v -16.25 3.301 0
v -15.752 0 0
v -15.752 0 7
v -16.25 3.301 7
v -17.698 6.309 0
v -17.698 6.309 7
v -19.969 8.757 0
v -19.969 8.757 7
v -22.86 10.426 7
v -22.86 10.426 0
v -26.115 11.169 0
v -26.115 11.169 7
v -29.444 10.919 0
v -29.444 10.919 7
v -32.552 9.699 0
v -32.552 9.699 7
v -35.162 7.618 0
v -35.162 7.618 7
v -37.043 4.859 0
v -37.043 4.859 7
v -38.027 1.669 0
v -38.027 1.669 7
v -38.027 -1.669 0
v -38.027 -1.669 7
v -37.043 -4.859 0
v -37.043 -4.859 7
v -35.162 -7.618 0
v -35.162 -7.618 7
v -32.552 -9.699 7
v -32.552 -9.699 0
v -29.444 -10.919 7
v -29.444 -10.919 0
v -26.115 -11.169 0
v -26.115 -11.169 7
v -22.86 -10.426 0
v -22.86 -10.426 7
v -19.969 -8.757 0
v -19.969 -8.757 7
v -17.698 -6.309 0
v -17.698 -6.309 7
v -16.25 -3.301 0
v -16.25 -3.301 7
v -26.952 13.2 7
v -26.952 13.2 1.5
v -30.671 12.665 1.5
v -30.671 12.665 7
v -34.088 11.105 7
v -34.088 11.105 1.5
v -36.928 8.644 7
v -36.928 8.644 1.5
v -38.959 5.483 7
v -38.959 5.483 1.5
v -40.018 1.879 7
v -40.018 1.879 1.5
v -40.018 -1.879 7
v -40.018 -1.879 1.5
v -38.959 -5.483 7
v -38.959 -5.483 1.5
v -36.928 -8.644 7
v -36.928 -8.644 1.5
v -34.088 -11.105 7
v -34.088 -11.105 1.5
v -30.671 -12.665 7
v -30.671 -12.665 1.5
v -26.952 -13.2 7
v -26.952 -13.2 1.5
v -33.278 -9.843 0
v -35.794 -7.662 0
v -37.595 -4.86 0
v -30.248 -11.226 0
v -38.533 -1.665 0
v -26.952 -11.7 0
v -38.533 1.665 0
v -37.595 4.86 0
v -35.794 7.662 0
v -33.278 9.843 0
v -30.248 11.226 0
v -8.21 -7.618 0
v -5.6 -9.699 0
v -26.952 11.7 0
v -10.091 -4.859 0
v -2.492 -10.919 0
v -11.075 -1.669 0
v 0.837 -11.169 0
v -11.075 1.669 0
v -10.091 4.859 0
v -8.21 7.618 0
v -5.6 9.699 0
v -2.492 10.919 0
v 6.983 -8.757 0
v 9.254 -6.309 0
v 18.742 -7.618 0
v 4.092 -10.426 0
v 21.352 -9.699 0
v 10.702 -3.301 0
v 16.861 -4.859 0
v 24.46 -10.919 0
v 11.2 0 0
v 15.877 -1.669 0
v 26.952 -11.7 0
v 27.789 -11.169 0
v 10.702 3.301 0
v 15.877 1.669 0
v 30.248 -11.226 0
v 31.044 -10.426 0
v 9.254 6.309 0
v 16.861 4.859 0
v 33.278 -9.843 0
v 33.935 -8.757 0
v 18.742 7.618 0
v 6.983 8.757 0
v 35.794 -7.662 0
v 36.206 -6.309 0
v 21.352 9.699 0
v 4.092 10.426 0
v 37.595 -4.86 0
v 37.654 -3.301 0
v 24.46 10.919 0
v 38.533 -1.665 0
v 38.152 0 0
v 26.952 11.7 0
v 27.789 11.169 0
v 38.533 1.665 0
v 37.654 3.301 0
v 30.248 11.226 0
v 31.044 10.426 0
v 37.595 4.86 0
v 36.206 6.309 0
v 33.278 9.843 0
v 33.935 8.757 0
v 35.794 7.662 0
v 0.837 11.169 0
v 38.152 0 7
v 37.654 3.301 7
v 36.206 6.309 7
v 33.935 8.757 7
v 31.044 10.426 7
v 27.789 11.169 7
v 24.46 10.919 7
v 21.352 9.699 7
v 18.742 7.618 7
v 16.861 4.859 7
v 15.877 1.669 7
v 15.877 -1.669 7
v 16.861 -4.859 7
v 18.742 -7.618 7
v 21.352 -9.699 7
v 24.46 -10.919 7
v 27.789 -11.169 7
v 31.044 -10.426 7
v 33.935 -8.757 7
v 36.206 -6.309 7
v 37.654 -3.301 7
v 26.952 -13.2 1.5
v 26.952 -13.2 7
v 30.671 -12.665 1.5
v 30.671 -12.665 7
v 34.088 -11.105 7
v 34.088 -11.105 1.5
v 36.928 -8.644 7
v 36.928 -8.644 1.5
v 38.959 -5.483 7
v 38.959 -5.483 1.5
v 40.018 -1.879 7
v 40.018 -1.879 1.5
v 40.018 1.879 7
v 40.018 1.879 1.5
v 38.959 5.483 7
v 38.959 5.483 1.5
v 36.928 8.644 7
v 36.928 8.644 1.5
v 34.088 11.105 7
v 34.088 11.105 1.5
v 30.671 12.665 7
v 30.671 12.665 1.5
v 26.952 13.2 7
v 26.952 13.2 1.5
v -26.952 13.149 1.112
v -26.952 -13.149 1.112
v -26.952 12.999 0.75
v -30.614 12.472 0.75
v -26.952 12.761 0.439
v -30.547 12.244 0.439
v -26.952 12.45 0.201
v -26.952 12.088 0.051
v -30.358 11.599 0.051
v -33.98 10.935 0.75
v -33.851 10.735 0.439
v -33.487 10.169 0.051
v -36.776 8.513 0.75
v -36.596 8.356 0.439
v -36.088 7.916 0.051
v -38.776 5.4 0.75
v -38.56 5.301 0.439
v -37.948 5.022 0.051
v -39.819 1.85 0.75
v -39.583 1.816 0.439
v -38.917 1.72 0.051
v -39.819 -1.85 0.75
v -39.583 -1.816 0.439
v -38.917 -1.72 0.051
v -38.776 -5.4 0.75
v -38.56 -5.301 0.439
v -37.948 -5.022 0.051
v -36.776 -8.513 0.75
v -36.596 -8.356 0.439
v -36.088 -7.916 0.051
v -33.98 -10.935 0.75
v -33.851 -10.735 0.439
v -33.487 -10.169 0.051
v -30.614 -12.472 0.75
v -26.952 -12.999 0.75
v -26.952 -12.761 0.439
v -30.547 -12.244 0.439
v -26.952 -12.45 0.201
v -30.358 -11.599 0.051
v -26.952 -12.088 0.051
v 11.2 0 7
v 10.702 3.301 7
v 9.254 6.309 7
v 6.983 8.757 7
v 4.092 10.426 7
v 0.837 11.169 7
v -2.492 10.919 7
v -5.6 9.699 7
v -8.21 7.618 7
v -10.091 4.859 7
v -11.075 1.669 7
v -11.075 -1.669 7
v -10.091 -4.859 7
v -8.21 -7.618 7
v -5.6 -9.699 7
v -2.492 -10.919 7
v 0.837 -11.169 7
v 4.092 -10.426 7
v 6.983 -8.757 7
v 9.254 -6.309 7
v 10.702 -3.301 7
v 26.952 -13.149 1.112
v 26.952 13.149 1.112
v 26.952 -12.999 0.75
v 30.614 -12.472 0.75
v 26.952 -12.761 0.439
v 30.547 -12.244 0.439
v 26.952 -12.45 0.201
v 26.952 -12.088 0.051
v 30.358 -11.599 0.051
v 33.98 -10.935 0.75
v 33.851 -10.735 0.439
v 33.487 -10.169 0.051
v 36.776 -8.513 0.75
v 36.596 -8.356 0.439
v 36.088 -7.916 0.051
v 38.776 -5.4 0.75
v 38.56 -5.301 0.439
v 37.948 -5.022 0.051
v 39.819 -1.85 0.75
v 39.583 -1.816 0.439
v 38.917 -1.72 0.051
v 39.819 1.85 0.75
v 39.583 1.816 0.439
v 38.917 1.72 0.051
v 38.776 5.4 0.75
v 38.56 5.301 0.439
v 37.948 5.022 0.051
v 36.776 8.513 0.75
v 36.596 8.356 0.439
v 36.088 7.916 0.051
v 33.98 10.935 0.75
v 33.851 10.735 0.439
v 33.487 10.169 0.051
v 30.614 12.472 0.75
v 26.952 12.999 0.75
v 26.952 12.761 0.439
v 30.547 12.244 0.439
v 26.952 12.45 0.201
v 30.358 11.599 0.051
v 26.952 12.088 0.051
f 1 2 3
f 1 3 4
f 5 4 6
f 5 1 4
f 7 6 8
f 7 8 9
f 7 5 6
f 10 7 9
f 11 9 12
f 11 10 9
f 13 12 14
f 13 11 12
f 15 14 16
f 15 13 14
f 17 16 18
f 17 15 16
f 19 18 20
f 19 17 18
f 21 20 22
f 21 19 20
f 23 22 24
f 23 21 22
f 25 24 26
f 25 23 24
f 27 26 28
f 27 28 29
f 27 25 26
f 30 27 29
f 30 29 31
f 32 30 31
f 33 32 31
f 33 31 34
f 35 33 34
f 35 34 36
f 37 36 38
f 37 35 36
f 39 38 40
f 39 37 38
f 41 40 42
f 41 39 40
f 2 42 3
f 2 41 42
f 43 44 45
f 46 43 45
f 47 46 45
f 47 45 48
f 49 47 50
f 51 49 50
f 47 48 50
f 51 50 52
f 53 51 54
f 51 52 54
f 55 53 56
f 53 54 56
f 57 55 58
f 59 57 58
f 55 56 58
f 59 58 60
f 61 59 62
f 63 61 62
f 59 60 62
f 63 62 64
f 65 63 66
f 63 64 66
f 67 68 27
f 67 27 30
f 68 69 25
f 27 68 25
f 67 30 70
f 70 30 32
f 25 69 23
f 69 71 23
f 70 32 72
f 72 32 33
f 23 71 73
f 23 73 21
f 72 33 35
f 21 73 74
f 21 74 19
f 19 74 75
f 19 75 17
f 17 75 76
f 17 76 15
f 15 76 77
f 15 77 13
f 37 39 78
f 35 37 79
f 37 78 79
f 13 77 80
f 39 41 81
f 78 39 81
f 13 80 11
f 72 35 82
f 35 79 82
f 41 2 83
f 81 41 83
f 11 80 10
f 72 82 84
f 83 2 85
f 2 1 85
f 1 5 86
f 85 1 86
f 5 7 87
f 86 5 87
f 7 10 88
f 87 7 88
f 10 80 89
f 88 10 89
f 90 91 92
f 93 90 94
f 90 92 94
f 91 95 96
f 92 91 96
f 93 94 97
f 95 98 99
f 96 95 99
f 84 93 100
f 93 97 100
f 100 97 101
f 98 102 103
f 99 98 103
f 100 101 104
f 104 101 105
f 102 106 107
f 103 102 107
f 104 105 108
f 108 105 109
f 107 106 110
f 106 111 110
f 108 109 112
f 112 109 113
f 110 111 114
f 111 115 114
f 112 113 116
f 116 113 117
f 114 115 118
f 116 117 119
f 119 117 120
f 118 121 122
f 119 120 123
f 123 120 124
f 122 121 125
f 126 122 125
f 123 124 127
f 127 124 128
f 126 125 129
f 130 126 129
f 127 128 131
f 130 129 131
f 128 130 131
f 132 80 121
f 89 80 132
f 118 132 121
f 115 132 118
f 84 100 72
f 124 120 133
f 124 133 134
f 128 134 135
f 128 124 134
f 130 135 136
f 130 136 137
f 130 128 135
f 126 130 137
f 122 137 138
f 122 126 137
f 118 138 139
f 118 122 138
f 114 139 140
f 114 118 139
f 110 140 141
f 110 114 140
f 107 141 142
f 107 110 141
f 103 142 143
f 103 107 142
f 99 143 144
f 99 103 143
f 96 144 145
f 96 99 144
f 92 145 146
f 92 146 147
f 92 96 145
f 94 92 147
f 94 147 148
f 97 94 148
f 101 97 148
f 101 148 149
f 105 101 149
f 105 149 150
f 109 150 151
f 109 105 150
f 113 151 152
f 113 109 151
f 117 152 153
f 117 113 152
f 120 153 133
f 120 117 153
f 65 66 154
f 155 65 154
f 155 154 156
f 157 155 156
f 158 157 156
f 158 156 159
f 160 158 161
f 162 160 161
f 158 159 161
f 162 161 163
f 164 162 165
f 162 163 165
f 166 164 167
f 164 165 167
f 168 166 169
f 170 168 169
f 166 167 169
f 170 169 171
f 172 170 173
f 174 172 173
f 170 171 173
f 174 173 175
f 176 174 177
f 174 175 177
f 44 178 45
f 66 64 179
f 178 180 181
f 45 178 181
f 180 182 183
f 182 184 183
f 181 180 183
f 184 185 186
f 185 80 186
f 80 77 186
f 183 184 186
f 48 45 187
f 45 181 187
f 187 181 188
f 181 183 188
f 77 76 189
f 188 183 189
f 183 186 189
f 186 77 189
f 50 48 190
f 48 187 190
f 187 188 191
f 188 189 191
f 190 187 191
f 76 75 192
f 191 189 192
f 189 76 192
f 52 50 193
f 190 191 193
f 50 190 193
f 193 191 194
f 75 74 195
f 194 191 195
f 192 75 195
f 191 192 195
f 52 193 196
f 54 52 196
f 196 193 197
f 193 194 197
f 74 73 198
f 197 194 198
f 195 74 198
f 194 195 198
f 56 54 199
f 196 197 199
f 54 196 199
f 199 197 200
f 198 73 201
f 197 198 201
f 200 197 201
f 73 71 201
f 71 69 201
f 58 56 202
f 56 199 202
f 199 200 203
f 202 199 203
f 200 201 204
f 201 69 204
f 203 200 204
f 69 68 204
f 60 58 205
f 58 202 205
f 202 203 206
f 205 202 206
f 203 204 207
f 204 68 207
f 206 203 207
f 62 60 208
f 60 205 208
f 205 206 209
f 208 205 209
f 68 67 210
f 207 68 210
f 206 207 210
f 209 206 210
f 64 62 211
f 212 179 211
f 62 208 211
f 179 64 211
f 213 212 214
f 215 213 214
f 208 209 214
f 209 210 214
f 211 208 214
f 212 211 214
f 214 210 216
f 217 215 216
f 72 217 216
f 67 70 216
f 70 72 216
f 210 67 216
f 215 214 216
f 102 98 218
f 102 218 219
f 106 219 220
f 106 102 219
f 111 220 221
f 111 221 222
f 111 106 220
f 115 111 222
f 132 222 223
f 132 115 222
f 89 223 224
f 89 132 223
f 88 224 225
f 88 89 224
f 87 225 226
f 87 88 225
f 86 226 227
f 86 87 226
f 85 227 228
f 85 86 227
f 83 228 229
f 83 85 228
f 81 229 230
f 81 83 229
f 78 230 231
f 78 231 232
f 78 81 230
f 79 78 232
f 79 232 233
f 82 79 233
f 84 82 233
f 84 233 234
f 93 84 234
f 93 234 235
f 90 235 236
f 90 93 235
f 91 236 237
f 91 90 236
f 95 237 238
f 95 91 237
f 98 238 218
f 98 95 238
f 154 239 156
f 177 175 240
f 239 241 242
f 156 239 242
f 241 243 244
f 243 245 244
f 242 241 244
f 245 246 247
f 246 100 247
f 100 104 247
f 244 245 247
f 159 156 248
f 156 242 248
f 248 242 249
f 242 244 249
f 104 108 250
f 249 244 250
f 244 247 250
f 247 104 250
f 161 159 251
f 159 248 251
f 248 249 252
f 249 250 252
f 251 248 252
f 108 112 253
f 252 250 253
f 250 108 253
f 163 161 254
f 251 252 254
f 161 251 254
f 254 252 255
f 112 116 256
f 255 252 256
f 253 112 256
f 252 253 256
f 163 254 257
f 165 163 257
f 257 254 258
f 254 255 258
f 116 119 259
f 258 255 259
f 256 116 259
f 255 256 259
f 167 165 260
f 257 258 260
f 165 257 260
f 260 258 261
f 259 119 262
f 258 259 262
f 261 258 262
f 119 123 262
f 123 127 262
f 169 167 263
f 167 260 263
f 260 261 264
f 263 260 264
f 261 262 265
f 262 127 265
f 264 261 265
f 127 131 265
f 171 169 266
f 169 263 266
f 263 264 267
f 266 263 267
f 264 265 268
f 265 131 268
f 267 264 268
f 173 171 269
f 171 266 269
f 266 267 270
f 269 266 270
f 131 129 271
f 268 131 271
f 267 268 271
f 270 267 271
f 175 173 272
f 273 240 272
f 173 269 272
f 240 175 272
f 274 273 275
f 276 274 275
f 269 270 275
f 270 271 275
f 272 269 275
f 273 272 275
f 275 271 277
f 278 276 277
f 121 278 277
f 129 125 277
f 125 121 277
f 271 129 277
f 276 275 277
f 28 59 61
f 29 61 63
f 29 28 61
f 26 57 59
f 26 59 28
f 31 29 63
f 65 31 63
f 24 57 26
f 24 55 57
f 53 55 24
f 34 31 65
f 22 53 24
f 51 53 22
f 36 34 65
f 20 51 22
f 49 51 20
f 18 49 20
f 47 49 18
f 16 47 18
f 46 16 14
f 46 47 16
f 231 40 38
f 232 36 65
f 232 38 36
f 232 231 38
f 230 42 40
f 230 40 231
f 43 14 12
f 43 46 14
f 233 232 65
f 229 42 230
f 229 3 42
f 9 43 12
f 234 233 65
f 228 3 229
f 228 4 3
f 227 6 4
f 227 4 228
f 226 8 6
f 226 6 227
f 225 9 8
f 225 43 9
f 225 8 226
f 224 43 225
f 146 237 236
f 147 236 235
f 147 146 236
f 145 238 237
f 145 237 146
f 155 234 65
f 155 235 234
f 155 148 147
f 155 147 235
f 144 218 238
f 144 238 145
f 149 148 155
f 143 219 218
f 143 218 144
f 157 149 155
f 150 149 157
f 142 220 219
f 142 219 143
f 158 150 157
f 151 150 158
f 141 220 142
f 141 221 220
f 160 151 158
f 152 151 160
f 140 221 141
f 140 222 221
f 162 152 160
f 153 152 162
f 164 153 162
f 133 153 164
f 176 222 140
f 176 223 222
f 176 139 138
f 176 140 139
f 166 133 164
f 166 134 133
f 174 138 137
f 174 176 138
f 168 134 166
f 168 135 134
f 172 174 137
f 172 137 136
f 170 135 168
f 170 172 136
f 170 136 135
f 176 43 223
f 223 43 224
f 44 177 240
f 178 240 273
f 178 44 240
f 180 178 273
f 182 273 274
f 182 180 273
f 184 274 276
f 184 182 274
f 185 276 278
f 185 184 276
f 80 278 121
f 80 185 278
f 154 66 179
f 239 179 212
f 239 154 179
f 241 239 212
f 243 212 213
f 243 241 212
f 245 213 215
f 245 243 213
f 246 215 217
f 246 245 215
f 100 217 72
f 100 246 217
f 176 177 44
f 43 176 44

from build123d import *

# Parameters (mm, degrees)
F0_R     = 11.2
F1_DEPTH = 7
F2_R     = 1.5


with BuildPart() as f1:
    # F0 (on Top) → F1 (new body)
    with BuildSketch(Plane.XY):
        with BuildLine():
            Line((0, 13.2), (-26.95201, 13.2))
            ThreePointArc((-26.95201, 13.2), (-40.15201, 0), (-26.95201, -13.2))
            Line((-26.95201, -13.2), (0, -13.2))
            Line((0, -13.2), (26.95201, -13.2))
            ThreePointArc((26.95201, -13.2), (40.15201, 0), (26.95201, 13.2))
            Line((26.95201, 13.2), (0, 13.2))
        make_face()
        with Locations((-26.95201, 0)):
            Circle(F0_R, mode=Mode.SUBTRACT)
        Circle(F0_R, mode=Mode.SUBTRACT)
        with Locations((26.95201, 0)):
            Circle(F0_R, mode=Mode.SUBTRACT)
    extrude(amount=F1_DEPTH)

    # F2
    f2_edges = [f1.edges().sort_by_distance(p)[0] for p in [
        (0, 13.2, 0),
        (-40.15201, 0, 0),
        (0, -13.2, 0),
        (40.15201, 0, 0),
    ]]
    fillet(f2_edges, radius=F2_R)


solid = f1.part
